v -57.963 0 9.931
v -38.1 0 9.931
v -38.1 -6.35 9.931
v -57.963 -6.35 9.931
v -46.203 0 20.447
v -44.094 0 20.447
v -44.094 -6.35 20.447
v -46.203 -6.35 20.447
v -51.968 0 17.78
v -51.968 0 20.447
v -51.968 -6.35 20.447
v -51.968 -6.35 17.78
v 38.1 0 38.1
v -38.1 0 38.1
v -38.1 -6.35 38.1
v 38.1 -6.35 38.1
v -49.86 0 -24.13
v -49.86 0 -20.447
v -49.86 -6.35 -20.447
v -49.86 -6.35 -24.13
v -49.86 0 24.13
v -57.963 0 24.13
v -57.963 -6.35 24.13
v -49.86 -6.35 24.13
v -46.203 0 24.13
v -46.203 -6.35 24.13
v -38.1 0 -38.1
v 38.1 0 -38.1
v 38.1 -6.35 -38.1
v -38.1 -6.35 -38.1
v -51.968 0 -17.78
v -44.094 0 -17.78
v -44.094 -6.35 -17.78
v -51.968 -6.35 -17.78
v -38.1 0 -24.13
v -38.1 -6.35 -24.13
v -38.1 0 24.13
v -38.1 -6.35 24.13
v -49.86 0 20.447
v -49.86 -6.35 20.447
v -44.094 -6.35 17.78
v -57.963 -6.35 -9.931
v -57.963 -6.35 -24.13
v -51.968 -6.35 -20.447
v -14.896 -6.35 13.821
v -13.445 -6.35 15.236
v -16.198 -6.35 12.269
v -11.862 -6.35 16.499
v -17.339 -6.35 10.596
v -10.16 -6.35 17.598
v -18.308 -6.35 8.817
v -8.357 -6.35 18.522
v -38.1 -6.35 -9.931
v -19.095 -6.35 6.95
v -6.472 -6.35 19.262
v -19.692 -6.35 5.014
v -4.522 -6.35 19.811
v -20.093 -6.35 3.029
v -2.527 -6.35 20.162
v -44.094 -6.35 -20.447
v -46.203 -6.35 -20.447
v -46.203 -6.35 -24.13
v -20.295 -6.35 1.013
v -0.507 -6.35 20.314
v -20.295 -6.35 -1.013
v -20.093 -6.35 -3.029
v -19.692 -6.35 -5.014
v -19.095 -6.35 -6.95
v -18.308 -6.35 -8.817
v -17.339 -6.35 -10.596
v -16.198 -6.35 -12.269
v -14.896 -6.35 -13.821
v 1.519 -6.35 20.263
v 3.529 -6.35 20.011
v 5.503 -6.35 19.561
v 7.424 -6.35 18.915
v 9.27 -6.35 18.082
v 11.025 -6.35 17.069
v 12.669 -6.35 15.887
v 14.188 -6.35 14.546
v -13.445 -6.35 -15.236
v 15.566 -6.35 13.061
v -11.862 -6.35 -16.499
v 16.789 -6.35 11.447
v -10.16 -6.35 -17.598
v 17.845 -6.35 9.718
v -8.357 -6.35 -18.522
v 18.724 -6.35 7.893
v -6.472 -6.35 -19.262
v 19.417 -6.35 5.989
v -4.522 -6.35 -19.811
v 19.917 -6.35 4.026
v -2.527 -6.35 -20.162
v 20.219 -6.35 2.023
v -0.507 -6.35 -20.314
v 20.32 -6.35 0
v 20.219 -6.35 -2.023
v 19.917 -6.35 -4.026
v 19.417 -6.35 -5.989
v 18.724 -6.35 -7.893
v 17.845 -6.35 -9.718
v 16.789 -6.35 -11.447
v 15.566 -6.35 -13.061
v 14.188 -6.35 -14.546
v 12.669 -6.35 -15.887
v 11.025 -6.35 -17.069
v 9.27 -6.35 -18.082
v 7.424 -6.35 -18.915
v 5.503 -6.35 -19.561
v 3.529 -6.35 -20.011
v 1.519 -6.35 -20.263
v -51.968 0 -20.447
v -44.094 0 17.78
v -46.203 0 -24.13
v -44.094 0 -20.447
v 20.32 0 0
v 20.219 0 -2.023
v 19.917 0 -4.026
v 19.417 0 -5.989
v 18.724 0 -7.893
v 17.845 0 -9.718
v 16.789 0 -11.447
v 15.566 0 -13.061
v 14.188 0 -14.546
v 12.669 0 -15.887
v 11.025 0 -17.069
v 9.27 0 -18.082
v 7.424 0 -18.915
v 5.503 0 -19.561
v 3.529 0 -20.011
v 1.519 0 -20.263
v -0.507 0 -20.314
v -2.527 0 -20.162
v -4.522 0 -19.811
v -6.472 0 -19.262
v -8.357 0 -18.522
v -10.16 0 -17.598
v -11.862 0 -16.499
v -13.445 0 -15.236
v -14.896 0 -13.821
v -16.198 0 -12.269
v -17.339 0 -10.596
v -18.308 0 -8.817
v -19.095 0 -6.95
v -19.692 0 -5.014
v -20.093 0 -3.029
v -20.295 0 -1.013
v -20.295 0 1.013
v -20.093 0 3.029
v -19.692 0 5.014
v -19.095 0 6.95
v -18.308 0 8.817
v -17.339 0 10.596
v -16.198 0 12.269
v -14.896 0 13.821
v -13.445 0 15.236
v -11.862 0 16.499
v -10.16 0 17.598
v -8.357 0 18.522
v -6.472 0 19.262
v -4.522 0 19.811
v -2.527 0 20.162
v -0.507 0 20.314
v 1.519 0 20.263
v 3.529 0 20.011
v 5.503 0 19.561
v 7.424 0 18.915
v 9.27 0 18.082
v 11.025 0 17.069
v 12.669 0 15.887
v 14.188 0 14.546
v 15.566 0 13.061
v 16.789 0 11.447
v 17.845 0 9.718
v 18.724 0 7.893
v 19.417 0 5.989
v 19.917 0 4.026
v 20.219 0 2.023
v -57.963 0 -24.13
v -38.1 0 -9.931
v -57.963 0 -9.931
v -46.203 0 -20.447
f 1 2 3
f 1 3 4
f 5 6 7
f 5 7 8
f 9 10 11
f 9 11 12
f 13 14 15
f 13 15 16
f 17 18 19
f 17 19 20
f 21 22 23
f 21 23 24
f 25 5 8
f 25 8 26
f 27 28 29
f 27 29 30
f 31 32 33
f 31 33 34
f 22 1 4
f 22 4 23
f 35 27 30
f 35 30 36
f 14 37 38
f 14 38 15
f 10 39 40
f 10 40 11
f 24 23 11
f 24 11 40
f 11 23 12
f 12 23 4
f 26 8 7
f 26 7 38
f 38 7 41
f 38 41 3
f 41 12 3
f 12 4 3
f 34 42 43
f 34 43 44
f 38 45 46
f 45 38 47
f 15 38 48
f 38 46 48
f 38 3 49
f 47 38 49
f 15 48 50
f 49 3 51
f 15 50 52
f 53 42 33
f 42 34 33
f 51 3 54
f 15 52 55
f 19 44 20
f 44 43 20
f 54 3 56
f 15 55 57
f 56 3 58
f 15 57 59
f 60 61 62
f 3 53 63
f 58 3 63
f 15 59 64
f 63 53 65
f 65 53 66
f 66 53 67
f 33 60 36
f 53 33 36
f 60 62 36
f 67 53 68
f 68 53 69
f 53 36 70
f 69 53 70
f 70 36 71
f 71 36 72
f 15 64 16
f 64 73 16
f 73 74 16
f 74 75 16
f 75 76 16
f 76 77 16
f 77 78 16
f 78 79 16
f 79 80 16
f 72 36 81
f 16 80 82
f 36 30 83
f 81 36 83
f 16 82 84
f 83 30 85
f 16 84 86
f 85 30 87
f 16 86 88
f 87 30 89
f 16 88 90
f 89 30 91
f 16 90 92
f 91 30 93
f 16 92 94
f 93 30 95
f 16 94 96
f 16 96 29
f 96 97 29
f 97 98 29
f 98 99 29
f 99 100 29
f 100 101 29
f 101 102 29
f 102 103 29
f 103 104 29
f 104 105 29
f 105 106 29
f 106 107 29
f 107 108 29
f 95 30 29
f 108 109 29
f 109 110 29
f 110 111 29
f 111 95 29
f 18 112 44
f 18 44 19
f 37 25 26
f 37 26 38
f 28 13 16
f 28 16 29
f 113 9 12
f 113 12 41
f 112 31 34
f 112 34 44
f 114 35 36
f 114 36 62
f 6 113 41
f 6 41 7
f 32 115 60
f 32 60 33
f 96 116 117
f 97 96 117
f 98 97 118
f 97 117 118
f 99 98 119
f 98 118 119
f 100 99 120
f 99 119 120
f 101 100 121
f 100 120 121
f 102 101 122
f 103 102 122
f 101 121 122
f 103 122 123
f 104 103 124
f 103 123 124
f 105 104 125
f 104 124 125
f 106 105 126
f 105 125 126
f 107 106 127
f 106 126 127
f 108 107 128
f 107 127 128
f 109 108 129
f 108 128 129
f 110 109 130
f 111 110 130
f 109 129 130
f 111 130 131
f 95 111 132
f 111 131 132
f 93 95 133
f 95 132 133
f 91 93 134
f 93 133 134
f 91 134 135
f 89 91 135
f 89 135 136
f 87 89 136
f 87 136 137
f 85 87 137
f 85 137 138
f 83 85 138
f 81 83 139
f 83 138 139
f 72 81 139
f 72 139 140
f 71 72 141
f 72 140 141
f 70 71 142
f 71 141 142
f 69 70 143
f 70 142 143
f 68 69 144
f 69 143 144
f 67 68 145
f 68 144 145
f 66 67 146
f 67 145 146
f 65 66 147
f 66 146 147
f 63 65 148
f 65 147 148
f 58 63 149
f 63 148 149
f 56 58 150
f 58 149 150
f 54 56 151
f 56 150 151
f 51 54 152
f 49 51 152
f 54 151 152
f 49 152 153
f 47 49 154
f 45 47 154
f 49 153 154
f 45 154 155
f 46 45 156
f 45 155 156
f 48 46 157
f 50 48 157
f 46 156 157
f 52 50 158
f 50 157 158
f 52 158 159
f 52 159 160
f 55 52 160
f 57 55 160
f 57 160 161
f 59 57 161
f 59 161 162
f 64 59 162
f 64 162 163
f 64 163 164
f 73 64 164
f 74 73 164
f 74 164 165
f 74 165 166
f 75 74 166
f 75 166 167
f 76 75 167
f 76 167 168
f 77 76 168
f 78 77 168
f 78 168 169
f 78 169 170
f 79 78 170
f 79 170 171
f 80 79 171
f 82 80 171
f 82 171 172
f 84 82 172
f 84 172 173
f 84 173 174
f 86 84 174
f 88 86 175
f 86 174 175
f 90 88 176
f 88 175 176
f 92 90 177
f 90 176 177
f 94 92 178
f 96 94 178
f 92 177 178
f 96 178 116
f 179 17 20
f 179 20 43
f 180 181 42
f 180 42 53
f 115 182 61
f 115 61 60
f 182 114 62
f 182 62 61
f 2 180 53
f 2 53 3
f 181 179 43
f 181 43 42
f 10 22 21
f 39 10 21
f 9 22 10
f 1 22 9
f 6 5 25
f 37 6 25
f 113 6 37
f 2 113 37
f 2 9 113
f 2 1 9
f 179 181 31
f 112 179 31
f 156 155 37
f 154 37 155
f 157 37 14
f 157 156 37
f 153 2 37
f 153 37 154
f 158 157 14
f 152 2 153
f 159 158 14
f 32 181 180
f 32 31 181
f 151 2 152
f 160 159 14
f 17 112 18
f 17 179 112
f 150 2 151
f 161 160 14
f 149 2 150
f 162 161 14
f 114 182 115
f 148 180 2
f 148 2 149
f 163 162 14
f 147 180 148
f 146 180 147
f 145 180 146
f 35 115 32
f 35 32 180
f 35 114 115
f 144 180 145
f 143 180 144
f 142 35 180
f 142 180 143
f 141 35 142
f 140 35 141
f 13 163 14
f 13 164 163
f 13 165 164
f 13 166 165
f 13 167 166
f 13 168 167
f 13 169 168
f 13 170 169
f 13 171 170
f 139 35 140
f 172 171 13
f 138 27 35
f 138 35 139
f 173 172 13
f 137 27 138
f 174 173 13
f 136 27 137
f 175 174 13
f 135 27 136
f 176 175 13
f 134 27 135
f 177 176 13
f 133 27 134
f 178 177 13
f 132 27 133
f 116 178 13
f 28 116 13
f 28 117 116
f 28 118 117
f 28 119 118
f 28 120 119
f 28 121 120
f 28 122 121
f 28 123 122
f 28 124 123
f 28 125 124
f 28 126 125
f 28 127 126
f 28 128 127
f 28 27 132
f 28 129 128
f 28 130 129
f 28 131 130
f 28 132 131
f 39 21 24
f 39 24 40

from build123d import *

# Parameters (mm, degrees)
SKETCH1_R           = 20.32
BOSS_EXTRUDE1_DEPTH = 6.35


with BuildPart() as part:
    # Sketch1 → Boss-Extrude1 (new body)
    with BuildSketch(Plane(origin=(0, 0, 0), x_dir=(1, 0, 0), z_dir=(0, 1, 0))):
        Polygon((-38.1, -38.1), (38.1, -38.1), (38.1, 38.1), (-38.1, 38.1), (-38.1, 24.13), (-46.2026, 24.13), (-46.2026, 20.447), (-44.0944, 20.447), (-44.0944, 17.78), (-51.9684, 17.78), (-51.9684, 20.447), (-49.8602, 20.447), (-49.8602, 24.13), (-57.9628, 24.13), (-57.9628, 9.9314), (-38.1, 9.9314), (-38.1, -9.9314), (-57.9628, -9.9314), (-57.9628, -24.13), (-49.8602, -24.13), (-49.8602, -20.447), (-51.9684, -20.447), (-51.9684, -17.78), (-44.0944, -17.78), (-44.0944, -20.447), (-46.2026, -20.447), (-46.2026, -24.13), (-38.1, -24.13), align=None)
        Circle(SKETCH1_R, mode=Mode.SUBTRACT)
    extrude(amount=-BOSS_EXTRUDE1_DEPTH)


solid = part.part
